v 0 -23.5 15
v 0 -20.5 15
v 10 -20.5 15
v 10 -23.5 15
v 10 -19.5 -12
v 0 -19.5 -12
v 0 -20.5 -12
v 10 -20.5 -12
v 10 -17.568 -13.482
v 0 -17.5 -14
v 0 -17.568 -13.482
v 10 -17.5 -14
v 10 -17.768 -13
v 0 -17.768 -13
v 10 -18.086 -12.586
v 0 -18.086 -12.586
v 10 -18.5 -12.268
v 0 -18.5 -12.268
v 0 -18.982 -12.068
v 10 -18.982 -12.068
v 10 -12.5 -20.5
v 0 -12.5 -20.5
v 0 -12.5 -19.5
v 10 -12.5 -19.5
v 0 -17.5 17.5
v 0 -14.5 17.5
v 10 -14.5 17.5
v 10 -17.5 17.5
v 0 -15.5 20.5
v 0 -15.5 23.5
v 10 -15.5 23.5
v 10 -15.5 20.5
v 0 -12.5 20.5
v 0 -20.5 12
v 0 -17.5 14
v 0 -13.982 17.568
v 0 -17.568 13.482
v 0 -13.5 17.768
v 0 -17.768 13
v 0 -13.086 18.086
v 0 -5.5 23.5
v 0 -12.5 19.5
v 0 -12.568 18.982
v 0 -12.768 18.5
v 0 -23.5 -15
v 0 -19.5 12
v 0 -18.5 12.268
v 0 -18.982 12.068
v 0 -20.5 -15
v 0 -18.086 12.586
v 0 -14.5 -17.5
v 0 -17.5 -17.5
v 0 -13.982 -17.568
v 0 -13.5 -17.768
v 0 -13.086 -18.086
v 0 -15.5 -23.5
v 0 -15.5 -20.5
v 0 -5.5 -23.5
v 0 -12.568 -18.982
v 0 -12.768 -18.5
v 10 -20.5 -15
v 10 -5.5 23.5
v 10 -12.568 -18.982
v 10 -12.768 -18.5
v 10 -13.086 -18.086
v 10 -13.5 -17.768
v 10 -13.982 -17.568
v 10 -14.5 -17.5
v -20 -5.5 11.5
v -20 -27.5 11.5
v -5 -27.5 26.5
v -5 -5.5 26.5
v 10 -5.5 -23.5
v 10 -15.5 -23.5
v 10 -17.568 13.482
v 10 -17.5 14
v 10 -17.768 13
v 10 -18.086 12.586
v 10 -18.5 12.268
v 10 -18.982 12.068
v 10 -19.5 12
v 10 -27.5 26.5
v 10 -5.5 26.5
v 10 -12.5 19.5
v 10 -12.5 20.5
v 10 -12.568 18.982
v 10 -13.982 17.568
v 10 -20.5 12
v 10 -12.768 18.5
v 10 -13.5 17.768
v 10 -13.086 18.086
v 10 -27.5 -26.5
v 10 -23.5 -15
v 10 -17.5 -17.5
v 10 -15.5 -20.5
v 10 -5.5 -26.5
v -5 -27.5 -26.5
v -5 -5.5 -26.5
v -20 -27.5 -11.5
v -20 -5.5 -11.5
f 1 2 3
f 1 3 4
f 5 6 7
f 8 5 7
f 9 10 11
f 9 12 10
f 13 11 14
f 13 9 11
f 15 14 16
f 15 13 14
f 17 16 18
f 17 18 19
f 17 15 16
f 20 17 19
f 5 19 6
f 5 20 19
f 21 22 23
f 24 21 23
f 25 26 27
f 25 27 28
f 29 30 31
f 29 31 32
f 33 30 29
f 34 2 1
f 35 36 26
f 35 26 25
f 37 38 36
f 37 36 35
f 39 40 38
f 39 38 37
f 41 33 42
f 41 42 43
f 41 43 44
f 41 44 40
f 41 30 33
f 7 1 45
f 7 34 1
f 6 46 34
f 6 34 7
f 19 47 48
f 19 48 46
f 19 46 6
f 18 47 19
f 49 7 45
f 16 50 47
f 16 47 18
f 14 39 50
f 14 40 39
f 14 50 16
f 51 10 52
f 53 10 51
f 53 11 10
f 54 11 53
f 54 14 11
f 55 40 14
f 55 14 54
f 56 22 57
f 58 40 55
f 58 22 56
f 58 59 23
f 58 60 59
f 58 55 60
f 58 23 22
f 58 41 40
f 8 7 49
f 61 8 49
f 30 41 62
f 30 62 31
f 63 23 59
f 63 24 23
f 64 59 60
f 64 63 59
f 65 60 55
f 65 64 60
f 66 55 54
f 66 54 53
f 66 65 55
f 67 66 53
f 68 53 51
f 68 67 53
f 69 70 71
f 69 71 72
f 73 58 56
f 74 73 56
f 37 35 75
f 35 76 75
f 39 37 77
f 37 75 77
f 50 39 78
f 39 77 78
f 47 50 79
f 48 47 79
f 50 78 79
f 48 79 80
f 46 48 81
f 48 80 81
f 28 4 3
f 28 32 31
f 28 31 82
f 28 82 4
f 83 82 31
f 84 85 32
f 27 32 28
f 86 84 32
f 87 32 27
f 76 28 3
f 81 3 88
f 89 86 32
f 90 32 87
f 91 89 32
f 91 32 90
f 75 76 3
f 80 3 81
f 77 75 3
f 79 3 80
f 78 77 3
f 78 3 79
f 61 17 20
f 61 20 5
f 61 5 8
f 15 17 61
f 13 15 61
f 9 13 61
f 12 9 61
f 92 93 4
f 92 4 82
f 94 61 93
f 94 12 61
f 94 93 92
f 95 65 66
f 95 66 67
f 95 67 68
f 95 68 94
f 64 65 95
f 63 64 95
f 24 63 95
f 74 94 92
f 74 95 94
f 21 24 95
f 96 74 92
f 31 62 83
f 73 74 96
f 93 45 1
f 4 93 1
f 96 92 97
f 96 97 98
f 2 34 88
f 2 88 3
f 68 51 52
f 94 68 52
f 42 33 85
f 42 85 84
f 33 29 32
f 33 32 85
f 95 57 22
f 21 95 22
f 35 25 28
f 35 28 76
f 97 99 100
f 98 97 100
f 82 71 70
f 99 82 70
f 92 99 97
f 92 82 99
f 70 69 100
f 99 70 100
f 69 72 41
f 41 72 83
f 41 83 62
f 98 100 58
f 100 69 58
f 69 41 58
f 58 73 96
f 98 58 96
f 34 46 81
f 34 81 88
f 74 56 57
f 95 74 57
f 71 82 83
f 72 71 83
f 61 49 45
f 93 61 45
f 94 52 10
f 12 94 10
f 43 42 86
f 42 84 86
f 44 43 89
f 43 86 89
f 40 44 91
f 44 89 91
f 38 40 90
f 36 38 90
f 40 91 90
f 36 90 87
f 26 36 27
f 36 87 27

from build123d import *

# Parameters (mm, degrees)
BOSS_EXTRUDE1_DEPTH = 10
FILLET1_R           = 2
SKETCH2_W           = 26.5
SKETCH2_H           = 22
BOSS_EXTRUDE2_DEPTH = 20
CHAMFER1_SIZE       = 15


with BuildPart() as part:
    # Sketch1 → Boss-Extrude1 (new body)
    with BuildSketch(Plane(origin=(0, 0, 0), x_dir=(0, 0, -1), z_dir=(1, 0, 0))):
        Polygon((-26.5, -27.5), (-26.5, -5.5), (-23.5, -5.5), (-23.5, -15.5), (-20.5, -15.5), (-20.5, -12.5), (-17.5, -12.5), (-17.5, -17.5), (-12, -17.5), (-12, -20.5), (-15, -20.5), (-15, -23.5), (0, -23.5), (0, -27.5), align=None)
    extrude(amount=BOSS_EXTRUDE1_DEPTH)

    # Fillet1
    fillet1_edges = [part.edges().sort_by_distance(p)[0] for p in [
        (5, -12.5, 17.5),
        (5, -17.5, 12),
    ]]
    fillet(fillet1_edges, radius=FILLET1_R)

    # Sketch2 → Boss-Extrude2 (add)
    with BuildSketch(Plane.ZY):
        with Locations((13.25, -16.5)):
            Rectangle(SKETCH2_W, SKETCH2_H)
    extrude(amount=BOSS_EXTRUDE2_DEPTH)

    # Chamfer1
    chamfer1_edges = [part.edges().sort_by_distance(p)[0] for p in [
        (-20, -16.5, 26.5),
    ]]
    chamfer(chamfer1_edges, length=CHAMFER1_SIZE)

    # Mirror1: part across plane


with BuildPart() as part_1:
    add(part.part)
    add(part.part.mirror(Plane(origin=(10, -23.5, 0), x_dir=(1, 0, 0), z_dir=(0, 0, 1))))


solid = part_1.part
